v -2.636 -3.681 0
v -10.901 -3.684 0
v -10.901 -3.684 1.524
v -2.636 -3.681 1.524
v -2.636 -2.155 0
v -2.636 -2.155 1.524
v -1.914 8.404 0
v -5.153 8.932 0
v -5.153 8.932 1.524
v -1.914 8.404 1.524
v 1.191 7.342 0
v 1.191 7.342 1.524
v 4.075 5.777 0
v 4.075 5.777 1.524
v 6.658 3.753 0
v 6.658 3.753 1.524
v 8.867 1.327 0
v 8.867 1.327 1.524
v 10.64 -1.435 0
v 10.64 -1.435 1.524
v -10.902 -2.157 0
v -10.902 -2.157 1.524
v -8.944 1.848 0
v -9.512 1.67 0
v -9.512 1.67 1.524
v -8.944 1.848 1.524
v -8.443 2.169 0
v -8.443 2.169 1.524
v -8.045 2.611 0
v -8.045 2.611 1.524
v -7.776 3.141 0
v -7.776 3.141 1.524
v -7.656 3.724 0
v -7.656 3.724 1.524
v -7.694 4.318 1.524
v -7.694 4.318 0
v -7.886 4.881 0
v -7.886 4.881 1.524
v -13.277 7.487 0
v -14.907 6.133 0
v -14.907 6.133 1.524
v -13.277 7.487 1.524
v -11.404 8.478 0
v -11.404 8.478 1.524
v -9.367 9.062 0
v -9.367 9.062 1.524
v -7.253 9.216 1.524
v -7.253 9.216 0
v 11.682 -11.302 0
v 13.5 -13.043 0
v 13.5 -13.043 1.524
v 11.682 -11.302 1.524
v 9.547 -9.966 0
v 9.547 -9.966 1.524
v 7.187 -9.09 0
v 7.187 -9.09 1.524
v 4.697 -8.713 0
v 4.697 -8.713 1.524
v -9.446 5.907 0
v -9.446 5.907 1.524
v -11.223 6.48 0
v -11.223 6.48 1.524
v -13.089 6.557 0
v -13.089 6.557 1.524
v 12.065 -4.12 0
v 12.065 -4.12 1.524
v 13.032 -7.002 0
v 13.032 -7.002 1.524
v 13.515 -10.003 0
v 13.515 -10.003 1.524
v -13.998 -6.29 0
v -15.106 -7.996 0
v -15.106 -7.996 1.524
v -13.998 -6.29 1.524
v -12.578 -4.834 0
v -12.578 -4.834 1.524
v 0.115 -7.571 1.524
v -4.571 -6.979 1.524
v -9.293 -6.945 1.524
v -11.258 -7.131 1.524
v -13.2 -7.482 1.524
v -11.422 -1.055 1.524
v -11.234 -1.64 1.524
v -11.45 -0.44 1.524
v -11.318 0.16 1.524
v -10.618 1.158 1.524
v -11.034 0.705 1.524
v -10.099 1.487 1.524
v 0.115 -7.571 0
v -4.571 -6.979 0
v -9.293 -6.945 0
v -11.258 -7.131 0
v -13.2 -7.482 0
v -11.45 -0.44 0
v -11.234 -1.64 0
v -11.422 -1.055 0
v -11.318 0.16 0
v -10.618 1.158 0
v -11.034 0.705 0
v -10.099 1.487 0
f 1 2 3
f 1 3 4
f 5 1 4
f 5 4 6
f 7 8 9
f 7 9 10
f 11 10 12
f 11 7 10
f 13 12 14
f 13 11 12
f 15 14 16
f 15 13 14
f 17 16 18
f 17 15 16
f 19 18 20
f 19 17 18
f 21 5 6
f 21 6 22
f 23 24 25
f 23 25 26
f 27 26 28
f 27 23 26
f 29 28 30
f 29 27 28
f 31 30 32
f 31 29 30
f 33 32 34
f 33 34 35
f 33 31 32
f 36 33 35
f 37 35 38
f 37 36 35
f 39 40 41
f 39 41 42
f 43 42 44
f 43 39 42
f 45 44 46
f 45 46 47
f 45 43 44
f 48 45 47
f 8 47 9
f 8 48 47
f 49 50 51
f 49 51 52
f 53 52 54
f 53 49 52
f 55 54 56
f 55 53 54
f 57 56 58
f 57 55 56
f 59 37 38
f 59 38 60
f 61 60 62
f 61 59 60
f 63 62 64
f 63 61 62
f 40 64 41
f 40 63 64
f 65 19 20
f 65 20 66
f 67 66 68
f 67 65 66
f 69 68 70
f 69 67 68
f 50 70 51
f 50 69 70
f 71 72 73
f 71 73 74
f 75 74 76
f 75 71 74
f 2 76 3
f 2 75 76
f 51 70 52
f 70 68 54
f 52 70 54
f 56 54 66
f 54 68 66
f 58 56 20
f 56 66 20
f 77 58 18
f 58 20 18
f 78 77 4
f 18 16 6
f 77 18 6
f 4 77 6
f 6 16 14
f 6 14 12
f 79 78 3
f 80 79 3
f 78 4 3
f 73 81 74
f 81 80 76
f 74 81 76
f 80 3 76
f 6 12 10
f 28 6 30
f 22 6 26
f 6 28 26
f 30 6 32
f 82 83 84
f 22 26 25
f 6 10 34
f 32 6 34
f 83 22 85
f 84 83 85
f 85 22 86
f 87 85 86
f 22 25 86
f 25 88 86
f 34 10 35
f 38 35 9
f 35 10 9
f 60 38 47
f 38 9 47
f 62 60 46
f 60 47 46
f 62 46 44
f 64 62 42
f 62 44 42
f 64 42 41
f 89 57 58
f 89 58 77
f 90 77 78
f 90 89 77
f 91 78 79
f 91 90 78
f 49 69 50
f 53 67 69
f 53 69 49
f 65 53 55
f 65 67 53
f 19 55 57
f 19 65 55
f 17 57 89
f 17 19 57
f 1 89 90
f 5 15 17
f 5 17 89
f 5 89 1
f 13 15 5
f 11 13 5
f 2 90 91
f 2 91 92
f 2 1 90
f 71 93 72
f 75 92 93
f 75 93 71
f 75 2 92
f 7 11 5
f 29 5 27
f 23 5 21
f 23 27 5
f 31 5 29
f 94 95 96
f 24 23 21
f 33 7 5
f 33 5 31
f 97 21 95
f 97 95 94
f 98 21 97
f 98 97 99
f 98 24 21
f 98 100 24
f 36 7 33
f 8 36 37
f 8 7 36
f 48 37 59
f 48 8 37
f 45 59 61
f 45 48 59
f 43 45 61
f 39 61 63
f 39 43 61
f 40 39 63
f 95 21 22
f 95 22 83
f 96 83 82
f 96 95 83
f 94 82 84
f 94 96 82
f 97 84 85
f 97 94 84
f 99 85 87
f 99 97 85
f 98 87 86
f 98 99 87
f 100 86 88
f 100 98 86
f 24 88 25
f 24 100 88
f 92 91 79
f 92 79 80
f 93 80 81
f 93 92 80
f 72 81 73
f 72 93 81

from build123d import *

# Parameters (mm, degrees)
BOSS_EXTRUDE1_DEPTH = 1.524


with BuildPart() as part:
    # Sketch1 → Boss-Extrude1 (new body)
    with BuildSketch(Plane.XY):
        with BuildLine():
            Line((-10.900934465, -3.68364082), (-2.635951713, -3.681036987))
            Line((-2.635951713, -3.681036987), (-2.635951713, -2.155055787))
            Line((-2.635951713, -2.155055787), (-10.901683213, -2.157042615))
            ThreePointArc((-10.901683213, -2.157042615), (-11.317544758, 0.15997729), (-9.511729503, 1.670127391))
            ThreePointArc((-9.511729503, 1.670127391), (-7.892680295, 2.86711895), (-7.885754316, 4.88058888))
            ThreePointArc((-7.885754316, 4.88058888), (-11.223059029, 6.479724486), (-14.907398818, 6.132625428))
            ThreePointArc((-14.907398818, 6.132625428), (-10.400280149, 8.822736649), (-5.152538869, 8.932411295))
            ThreePointArc((-5.152538869, 8.932411295), (4.07543143, 5.777326615), (10.640409761, -1.4345424))
            ThreePointArc((10.640409761, -1.4345424), (13.031939874, -7.001943531), (13.500316897, -13.04313502))
            ThreePointArc((13.500316897, -13.04313502), (9.547445937, -9.965660072), (4.697121946, -8.71250483))
            ThreePointArc((4.697121946, -8.71250483), (-2.219244662, -7.205435551), (-9.293116928, -6.945212506))
            ThreePointArc((-9.293116928, -6.945212506), (-12.232846335, -7.286099179), (-15.105972143, -7.995578426))
            ThreePointArc((-15.105972143, -7.995578426), (-13.323913323, -5.527094328), (-10.900934465, -3.68364082))
        make_face()
    extrude(amount=BOSS_EXTRUDE1_DEPTH)


solid = part.part
